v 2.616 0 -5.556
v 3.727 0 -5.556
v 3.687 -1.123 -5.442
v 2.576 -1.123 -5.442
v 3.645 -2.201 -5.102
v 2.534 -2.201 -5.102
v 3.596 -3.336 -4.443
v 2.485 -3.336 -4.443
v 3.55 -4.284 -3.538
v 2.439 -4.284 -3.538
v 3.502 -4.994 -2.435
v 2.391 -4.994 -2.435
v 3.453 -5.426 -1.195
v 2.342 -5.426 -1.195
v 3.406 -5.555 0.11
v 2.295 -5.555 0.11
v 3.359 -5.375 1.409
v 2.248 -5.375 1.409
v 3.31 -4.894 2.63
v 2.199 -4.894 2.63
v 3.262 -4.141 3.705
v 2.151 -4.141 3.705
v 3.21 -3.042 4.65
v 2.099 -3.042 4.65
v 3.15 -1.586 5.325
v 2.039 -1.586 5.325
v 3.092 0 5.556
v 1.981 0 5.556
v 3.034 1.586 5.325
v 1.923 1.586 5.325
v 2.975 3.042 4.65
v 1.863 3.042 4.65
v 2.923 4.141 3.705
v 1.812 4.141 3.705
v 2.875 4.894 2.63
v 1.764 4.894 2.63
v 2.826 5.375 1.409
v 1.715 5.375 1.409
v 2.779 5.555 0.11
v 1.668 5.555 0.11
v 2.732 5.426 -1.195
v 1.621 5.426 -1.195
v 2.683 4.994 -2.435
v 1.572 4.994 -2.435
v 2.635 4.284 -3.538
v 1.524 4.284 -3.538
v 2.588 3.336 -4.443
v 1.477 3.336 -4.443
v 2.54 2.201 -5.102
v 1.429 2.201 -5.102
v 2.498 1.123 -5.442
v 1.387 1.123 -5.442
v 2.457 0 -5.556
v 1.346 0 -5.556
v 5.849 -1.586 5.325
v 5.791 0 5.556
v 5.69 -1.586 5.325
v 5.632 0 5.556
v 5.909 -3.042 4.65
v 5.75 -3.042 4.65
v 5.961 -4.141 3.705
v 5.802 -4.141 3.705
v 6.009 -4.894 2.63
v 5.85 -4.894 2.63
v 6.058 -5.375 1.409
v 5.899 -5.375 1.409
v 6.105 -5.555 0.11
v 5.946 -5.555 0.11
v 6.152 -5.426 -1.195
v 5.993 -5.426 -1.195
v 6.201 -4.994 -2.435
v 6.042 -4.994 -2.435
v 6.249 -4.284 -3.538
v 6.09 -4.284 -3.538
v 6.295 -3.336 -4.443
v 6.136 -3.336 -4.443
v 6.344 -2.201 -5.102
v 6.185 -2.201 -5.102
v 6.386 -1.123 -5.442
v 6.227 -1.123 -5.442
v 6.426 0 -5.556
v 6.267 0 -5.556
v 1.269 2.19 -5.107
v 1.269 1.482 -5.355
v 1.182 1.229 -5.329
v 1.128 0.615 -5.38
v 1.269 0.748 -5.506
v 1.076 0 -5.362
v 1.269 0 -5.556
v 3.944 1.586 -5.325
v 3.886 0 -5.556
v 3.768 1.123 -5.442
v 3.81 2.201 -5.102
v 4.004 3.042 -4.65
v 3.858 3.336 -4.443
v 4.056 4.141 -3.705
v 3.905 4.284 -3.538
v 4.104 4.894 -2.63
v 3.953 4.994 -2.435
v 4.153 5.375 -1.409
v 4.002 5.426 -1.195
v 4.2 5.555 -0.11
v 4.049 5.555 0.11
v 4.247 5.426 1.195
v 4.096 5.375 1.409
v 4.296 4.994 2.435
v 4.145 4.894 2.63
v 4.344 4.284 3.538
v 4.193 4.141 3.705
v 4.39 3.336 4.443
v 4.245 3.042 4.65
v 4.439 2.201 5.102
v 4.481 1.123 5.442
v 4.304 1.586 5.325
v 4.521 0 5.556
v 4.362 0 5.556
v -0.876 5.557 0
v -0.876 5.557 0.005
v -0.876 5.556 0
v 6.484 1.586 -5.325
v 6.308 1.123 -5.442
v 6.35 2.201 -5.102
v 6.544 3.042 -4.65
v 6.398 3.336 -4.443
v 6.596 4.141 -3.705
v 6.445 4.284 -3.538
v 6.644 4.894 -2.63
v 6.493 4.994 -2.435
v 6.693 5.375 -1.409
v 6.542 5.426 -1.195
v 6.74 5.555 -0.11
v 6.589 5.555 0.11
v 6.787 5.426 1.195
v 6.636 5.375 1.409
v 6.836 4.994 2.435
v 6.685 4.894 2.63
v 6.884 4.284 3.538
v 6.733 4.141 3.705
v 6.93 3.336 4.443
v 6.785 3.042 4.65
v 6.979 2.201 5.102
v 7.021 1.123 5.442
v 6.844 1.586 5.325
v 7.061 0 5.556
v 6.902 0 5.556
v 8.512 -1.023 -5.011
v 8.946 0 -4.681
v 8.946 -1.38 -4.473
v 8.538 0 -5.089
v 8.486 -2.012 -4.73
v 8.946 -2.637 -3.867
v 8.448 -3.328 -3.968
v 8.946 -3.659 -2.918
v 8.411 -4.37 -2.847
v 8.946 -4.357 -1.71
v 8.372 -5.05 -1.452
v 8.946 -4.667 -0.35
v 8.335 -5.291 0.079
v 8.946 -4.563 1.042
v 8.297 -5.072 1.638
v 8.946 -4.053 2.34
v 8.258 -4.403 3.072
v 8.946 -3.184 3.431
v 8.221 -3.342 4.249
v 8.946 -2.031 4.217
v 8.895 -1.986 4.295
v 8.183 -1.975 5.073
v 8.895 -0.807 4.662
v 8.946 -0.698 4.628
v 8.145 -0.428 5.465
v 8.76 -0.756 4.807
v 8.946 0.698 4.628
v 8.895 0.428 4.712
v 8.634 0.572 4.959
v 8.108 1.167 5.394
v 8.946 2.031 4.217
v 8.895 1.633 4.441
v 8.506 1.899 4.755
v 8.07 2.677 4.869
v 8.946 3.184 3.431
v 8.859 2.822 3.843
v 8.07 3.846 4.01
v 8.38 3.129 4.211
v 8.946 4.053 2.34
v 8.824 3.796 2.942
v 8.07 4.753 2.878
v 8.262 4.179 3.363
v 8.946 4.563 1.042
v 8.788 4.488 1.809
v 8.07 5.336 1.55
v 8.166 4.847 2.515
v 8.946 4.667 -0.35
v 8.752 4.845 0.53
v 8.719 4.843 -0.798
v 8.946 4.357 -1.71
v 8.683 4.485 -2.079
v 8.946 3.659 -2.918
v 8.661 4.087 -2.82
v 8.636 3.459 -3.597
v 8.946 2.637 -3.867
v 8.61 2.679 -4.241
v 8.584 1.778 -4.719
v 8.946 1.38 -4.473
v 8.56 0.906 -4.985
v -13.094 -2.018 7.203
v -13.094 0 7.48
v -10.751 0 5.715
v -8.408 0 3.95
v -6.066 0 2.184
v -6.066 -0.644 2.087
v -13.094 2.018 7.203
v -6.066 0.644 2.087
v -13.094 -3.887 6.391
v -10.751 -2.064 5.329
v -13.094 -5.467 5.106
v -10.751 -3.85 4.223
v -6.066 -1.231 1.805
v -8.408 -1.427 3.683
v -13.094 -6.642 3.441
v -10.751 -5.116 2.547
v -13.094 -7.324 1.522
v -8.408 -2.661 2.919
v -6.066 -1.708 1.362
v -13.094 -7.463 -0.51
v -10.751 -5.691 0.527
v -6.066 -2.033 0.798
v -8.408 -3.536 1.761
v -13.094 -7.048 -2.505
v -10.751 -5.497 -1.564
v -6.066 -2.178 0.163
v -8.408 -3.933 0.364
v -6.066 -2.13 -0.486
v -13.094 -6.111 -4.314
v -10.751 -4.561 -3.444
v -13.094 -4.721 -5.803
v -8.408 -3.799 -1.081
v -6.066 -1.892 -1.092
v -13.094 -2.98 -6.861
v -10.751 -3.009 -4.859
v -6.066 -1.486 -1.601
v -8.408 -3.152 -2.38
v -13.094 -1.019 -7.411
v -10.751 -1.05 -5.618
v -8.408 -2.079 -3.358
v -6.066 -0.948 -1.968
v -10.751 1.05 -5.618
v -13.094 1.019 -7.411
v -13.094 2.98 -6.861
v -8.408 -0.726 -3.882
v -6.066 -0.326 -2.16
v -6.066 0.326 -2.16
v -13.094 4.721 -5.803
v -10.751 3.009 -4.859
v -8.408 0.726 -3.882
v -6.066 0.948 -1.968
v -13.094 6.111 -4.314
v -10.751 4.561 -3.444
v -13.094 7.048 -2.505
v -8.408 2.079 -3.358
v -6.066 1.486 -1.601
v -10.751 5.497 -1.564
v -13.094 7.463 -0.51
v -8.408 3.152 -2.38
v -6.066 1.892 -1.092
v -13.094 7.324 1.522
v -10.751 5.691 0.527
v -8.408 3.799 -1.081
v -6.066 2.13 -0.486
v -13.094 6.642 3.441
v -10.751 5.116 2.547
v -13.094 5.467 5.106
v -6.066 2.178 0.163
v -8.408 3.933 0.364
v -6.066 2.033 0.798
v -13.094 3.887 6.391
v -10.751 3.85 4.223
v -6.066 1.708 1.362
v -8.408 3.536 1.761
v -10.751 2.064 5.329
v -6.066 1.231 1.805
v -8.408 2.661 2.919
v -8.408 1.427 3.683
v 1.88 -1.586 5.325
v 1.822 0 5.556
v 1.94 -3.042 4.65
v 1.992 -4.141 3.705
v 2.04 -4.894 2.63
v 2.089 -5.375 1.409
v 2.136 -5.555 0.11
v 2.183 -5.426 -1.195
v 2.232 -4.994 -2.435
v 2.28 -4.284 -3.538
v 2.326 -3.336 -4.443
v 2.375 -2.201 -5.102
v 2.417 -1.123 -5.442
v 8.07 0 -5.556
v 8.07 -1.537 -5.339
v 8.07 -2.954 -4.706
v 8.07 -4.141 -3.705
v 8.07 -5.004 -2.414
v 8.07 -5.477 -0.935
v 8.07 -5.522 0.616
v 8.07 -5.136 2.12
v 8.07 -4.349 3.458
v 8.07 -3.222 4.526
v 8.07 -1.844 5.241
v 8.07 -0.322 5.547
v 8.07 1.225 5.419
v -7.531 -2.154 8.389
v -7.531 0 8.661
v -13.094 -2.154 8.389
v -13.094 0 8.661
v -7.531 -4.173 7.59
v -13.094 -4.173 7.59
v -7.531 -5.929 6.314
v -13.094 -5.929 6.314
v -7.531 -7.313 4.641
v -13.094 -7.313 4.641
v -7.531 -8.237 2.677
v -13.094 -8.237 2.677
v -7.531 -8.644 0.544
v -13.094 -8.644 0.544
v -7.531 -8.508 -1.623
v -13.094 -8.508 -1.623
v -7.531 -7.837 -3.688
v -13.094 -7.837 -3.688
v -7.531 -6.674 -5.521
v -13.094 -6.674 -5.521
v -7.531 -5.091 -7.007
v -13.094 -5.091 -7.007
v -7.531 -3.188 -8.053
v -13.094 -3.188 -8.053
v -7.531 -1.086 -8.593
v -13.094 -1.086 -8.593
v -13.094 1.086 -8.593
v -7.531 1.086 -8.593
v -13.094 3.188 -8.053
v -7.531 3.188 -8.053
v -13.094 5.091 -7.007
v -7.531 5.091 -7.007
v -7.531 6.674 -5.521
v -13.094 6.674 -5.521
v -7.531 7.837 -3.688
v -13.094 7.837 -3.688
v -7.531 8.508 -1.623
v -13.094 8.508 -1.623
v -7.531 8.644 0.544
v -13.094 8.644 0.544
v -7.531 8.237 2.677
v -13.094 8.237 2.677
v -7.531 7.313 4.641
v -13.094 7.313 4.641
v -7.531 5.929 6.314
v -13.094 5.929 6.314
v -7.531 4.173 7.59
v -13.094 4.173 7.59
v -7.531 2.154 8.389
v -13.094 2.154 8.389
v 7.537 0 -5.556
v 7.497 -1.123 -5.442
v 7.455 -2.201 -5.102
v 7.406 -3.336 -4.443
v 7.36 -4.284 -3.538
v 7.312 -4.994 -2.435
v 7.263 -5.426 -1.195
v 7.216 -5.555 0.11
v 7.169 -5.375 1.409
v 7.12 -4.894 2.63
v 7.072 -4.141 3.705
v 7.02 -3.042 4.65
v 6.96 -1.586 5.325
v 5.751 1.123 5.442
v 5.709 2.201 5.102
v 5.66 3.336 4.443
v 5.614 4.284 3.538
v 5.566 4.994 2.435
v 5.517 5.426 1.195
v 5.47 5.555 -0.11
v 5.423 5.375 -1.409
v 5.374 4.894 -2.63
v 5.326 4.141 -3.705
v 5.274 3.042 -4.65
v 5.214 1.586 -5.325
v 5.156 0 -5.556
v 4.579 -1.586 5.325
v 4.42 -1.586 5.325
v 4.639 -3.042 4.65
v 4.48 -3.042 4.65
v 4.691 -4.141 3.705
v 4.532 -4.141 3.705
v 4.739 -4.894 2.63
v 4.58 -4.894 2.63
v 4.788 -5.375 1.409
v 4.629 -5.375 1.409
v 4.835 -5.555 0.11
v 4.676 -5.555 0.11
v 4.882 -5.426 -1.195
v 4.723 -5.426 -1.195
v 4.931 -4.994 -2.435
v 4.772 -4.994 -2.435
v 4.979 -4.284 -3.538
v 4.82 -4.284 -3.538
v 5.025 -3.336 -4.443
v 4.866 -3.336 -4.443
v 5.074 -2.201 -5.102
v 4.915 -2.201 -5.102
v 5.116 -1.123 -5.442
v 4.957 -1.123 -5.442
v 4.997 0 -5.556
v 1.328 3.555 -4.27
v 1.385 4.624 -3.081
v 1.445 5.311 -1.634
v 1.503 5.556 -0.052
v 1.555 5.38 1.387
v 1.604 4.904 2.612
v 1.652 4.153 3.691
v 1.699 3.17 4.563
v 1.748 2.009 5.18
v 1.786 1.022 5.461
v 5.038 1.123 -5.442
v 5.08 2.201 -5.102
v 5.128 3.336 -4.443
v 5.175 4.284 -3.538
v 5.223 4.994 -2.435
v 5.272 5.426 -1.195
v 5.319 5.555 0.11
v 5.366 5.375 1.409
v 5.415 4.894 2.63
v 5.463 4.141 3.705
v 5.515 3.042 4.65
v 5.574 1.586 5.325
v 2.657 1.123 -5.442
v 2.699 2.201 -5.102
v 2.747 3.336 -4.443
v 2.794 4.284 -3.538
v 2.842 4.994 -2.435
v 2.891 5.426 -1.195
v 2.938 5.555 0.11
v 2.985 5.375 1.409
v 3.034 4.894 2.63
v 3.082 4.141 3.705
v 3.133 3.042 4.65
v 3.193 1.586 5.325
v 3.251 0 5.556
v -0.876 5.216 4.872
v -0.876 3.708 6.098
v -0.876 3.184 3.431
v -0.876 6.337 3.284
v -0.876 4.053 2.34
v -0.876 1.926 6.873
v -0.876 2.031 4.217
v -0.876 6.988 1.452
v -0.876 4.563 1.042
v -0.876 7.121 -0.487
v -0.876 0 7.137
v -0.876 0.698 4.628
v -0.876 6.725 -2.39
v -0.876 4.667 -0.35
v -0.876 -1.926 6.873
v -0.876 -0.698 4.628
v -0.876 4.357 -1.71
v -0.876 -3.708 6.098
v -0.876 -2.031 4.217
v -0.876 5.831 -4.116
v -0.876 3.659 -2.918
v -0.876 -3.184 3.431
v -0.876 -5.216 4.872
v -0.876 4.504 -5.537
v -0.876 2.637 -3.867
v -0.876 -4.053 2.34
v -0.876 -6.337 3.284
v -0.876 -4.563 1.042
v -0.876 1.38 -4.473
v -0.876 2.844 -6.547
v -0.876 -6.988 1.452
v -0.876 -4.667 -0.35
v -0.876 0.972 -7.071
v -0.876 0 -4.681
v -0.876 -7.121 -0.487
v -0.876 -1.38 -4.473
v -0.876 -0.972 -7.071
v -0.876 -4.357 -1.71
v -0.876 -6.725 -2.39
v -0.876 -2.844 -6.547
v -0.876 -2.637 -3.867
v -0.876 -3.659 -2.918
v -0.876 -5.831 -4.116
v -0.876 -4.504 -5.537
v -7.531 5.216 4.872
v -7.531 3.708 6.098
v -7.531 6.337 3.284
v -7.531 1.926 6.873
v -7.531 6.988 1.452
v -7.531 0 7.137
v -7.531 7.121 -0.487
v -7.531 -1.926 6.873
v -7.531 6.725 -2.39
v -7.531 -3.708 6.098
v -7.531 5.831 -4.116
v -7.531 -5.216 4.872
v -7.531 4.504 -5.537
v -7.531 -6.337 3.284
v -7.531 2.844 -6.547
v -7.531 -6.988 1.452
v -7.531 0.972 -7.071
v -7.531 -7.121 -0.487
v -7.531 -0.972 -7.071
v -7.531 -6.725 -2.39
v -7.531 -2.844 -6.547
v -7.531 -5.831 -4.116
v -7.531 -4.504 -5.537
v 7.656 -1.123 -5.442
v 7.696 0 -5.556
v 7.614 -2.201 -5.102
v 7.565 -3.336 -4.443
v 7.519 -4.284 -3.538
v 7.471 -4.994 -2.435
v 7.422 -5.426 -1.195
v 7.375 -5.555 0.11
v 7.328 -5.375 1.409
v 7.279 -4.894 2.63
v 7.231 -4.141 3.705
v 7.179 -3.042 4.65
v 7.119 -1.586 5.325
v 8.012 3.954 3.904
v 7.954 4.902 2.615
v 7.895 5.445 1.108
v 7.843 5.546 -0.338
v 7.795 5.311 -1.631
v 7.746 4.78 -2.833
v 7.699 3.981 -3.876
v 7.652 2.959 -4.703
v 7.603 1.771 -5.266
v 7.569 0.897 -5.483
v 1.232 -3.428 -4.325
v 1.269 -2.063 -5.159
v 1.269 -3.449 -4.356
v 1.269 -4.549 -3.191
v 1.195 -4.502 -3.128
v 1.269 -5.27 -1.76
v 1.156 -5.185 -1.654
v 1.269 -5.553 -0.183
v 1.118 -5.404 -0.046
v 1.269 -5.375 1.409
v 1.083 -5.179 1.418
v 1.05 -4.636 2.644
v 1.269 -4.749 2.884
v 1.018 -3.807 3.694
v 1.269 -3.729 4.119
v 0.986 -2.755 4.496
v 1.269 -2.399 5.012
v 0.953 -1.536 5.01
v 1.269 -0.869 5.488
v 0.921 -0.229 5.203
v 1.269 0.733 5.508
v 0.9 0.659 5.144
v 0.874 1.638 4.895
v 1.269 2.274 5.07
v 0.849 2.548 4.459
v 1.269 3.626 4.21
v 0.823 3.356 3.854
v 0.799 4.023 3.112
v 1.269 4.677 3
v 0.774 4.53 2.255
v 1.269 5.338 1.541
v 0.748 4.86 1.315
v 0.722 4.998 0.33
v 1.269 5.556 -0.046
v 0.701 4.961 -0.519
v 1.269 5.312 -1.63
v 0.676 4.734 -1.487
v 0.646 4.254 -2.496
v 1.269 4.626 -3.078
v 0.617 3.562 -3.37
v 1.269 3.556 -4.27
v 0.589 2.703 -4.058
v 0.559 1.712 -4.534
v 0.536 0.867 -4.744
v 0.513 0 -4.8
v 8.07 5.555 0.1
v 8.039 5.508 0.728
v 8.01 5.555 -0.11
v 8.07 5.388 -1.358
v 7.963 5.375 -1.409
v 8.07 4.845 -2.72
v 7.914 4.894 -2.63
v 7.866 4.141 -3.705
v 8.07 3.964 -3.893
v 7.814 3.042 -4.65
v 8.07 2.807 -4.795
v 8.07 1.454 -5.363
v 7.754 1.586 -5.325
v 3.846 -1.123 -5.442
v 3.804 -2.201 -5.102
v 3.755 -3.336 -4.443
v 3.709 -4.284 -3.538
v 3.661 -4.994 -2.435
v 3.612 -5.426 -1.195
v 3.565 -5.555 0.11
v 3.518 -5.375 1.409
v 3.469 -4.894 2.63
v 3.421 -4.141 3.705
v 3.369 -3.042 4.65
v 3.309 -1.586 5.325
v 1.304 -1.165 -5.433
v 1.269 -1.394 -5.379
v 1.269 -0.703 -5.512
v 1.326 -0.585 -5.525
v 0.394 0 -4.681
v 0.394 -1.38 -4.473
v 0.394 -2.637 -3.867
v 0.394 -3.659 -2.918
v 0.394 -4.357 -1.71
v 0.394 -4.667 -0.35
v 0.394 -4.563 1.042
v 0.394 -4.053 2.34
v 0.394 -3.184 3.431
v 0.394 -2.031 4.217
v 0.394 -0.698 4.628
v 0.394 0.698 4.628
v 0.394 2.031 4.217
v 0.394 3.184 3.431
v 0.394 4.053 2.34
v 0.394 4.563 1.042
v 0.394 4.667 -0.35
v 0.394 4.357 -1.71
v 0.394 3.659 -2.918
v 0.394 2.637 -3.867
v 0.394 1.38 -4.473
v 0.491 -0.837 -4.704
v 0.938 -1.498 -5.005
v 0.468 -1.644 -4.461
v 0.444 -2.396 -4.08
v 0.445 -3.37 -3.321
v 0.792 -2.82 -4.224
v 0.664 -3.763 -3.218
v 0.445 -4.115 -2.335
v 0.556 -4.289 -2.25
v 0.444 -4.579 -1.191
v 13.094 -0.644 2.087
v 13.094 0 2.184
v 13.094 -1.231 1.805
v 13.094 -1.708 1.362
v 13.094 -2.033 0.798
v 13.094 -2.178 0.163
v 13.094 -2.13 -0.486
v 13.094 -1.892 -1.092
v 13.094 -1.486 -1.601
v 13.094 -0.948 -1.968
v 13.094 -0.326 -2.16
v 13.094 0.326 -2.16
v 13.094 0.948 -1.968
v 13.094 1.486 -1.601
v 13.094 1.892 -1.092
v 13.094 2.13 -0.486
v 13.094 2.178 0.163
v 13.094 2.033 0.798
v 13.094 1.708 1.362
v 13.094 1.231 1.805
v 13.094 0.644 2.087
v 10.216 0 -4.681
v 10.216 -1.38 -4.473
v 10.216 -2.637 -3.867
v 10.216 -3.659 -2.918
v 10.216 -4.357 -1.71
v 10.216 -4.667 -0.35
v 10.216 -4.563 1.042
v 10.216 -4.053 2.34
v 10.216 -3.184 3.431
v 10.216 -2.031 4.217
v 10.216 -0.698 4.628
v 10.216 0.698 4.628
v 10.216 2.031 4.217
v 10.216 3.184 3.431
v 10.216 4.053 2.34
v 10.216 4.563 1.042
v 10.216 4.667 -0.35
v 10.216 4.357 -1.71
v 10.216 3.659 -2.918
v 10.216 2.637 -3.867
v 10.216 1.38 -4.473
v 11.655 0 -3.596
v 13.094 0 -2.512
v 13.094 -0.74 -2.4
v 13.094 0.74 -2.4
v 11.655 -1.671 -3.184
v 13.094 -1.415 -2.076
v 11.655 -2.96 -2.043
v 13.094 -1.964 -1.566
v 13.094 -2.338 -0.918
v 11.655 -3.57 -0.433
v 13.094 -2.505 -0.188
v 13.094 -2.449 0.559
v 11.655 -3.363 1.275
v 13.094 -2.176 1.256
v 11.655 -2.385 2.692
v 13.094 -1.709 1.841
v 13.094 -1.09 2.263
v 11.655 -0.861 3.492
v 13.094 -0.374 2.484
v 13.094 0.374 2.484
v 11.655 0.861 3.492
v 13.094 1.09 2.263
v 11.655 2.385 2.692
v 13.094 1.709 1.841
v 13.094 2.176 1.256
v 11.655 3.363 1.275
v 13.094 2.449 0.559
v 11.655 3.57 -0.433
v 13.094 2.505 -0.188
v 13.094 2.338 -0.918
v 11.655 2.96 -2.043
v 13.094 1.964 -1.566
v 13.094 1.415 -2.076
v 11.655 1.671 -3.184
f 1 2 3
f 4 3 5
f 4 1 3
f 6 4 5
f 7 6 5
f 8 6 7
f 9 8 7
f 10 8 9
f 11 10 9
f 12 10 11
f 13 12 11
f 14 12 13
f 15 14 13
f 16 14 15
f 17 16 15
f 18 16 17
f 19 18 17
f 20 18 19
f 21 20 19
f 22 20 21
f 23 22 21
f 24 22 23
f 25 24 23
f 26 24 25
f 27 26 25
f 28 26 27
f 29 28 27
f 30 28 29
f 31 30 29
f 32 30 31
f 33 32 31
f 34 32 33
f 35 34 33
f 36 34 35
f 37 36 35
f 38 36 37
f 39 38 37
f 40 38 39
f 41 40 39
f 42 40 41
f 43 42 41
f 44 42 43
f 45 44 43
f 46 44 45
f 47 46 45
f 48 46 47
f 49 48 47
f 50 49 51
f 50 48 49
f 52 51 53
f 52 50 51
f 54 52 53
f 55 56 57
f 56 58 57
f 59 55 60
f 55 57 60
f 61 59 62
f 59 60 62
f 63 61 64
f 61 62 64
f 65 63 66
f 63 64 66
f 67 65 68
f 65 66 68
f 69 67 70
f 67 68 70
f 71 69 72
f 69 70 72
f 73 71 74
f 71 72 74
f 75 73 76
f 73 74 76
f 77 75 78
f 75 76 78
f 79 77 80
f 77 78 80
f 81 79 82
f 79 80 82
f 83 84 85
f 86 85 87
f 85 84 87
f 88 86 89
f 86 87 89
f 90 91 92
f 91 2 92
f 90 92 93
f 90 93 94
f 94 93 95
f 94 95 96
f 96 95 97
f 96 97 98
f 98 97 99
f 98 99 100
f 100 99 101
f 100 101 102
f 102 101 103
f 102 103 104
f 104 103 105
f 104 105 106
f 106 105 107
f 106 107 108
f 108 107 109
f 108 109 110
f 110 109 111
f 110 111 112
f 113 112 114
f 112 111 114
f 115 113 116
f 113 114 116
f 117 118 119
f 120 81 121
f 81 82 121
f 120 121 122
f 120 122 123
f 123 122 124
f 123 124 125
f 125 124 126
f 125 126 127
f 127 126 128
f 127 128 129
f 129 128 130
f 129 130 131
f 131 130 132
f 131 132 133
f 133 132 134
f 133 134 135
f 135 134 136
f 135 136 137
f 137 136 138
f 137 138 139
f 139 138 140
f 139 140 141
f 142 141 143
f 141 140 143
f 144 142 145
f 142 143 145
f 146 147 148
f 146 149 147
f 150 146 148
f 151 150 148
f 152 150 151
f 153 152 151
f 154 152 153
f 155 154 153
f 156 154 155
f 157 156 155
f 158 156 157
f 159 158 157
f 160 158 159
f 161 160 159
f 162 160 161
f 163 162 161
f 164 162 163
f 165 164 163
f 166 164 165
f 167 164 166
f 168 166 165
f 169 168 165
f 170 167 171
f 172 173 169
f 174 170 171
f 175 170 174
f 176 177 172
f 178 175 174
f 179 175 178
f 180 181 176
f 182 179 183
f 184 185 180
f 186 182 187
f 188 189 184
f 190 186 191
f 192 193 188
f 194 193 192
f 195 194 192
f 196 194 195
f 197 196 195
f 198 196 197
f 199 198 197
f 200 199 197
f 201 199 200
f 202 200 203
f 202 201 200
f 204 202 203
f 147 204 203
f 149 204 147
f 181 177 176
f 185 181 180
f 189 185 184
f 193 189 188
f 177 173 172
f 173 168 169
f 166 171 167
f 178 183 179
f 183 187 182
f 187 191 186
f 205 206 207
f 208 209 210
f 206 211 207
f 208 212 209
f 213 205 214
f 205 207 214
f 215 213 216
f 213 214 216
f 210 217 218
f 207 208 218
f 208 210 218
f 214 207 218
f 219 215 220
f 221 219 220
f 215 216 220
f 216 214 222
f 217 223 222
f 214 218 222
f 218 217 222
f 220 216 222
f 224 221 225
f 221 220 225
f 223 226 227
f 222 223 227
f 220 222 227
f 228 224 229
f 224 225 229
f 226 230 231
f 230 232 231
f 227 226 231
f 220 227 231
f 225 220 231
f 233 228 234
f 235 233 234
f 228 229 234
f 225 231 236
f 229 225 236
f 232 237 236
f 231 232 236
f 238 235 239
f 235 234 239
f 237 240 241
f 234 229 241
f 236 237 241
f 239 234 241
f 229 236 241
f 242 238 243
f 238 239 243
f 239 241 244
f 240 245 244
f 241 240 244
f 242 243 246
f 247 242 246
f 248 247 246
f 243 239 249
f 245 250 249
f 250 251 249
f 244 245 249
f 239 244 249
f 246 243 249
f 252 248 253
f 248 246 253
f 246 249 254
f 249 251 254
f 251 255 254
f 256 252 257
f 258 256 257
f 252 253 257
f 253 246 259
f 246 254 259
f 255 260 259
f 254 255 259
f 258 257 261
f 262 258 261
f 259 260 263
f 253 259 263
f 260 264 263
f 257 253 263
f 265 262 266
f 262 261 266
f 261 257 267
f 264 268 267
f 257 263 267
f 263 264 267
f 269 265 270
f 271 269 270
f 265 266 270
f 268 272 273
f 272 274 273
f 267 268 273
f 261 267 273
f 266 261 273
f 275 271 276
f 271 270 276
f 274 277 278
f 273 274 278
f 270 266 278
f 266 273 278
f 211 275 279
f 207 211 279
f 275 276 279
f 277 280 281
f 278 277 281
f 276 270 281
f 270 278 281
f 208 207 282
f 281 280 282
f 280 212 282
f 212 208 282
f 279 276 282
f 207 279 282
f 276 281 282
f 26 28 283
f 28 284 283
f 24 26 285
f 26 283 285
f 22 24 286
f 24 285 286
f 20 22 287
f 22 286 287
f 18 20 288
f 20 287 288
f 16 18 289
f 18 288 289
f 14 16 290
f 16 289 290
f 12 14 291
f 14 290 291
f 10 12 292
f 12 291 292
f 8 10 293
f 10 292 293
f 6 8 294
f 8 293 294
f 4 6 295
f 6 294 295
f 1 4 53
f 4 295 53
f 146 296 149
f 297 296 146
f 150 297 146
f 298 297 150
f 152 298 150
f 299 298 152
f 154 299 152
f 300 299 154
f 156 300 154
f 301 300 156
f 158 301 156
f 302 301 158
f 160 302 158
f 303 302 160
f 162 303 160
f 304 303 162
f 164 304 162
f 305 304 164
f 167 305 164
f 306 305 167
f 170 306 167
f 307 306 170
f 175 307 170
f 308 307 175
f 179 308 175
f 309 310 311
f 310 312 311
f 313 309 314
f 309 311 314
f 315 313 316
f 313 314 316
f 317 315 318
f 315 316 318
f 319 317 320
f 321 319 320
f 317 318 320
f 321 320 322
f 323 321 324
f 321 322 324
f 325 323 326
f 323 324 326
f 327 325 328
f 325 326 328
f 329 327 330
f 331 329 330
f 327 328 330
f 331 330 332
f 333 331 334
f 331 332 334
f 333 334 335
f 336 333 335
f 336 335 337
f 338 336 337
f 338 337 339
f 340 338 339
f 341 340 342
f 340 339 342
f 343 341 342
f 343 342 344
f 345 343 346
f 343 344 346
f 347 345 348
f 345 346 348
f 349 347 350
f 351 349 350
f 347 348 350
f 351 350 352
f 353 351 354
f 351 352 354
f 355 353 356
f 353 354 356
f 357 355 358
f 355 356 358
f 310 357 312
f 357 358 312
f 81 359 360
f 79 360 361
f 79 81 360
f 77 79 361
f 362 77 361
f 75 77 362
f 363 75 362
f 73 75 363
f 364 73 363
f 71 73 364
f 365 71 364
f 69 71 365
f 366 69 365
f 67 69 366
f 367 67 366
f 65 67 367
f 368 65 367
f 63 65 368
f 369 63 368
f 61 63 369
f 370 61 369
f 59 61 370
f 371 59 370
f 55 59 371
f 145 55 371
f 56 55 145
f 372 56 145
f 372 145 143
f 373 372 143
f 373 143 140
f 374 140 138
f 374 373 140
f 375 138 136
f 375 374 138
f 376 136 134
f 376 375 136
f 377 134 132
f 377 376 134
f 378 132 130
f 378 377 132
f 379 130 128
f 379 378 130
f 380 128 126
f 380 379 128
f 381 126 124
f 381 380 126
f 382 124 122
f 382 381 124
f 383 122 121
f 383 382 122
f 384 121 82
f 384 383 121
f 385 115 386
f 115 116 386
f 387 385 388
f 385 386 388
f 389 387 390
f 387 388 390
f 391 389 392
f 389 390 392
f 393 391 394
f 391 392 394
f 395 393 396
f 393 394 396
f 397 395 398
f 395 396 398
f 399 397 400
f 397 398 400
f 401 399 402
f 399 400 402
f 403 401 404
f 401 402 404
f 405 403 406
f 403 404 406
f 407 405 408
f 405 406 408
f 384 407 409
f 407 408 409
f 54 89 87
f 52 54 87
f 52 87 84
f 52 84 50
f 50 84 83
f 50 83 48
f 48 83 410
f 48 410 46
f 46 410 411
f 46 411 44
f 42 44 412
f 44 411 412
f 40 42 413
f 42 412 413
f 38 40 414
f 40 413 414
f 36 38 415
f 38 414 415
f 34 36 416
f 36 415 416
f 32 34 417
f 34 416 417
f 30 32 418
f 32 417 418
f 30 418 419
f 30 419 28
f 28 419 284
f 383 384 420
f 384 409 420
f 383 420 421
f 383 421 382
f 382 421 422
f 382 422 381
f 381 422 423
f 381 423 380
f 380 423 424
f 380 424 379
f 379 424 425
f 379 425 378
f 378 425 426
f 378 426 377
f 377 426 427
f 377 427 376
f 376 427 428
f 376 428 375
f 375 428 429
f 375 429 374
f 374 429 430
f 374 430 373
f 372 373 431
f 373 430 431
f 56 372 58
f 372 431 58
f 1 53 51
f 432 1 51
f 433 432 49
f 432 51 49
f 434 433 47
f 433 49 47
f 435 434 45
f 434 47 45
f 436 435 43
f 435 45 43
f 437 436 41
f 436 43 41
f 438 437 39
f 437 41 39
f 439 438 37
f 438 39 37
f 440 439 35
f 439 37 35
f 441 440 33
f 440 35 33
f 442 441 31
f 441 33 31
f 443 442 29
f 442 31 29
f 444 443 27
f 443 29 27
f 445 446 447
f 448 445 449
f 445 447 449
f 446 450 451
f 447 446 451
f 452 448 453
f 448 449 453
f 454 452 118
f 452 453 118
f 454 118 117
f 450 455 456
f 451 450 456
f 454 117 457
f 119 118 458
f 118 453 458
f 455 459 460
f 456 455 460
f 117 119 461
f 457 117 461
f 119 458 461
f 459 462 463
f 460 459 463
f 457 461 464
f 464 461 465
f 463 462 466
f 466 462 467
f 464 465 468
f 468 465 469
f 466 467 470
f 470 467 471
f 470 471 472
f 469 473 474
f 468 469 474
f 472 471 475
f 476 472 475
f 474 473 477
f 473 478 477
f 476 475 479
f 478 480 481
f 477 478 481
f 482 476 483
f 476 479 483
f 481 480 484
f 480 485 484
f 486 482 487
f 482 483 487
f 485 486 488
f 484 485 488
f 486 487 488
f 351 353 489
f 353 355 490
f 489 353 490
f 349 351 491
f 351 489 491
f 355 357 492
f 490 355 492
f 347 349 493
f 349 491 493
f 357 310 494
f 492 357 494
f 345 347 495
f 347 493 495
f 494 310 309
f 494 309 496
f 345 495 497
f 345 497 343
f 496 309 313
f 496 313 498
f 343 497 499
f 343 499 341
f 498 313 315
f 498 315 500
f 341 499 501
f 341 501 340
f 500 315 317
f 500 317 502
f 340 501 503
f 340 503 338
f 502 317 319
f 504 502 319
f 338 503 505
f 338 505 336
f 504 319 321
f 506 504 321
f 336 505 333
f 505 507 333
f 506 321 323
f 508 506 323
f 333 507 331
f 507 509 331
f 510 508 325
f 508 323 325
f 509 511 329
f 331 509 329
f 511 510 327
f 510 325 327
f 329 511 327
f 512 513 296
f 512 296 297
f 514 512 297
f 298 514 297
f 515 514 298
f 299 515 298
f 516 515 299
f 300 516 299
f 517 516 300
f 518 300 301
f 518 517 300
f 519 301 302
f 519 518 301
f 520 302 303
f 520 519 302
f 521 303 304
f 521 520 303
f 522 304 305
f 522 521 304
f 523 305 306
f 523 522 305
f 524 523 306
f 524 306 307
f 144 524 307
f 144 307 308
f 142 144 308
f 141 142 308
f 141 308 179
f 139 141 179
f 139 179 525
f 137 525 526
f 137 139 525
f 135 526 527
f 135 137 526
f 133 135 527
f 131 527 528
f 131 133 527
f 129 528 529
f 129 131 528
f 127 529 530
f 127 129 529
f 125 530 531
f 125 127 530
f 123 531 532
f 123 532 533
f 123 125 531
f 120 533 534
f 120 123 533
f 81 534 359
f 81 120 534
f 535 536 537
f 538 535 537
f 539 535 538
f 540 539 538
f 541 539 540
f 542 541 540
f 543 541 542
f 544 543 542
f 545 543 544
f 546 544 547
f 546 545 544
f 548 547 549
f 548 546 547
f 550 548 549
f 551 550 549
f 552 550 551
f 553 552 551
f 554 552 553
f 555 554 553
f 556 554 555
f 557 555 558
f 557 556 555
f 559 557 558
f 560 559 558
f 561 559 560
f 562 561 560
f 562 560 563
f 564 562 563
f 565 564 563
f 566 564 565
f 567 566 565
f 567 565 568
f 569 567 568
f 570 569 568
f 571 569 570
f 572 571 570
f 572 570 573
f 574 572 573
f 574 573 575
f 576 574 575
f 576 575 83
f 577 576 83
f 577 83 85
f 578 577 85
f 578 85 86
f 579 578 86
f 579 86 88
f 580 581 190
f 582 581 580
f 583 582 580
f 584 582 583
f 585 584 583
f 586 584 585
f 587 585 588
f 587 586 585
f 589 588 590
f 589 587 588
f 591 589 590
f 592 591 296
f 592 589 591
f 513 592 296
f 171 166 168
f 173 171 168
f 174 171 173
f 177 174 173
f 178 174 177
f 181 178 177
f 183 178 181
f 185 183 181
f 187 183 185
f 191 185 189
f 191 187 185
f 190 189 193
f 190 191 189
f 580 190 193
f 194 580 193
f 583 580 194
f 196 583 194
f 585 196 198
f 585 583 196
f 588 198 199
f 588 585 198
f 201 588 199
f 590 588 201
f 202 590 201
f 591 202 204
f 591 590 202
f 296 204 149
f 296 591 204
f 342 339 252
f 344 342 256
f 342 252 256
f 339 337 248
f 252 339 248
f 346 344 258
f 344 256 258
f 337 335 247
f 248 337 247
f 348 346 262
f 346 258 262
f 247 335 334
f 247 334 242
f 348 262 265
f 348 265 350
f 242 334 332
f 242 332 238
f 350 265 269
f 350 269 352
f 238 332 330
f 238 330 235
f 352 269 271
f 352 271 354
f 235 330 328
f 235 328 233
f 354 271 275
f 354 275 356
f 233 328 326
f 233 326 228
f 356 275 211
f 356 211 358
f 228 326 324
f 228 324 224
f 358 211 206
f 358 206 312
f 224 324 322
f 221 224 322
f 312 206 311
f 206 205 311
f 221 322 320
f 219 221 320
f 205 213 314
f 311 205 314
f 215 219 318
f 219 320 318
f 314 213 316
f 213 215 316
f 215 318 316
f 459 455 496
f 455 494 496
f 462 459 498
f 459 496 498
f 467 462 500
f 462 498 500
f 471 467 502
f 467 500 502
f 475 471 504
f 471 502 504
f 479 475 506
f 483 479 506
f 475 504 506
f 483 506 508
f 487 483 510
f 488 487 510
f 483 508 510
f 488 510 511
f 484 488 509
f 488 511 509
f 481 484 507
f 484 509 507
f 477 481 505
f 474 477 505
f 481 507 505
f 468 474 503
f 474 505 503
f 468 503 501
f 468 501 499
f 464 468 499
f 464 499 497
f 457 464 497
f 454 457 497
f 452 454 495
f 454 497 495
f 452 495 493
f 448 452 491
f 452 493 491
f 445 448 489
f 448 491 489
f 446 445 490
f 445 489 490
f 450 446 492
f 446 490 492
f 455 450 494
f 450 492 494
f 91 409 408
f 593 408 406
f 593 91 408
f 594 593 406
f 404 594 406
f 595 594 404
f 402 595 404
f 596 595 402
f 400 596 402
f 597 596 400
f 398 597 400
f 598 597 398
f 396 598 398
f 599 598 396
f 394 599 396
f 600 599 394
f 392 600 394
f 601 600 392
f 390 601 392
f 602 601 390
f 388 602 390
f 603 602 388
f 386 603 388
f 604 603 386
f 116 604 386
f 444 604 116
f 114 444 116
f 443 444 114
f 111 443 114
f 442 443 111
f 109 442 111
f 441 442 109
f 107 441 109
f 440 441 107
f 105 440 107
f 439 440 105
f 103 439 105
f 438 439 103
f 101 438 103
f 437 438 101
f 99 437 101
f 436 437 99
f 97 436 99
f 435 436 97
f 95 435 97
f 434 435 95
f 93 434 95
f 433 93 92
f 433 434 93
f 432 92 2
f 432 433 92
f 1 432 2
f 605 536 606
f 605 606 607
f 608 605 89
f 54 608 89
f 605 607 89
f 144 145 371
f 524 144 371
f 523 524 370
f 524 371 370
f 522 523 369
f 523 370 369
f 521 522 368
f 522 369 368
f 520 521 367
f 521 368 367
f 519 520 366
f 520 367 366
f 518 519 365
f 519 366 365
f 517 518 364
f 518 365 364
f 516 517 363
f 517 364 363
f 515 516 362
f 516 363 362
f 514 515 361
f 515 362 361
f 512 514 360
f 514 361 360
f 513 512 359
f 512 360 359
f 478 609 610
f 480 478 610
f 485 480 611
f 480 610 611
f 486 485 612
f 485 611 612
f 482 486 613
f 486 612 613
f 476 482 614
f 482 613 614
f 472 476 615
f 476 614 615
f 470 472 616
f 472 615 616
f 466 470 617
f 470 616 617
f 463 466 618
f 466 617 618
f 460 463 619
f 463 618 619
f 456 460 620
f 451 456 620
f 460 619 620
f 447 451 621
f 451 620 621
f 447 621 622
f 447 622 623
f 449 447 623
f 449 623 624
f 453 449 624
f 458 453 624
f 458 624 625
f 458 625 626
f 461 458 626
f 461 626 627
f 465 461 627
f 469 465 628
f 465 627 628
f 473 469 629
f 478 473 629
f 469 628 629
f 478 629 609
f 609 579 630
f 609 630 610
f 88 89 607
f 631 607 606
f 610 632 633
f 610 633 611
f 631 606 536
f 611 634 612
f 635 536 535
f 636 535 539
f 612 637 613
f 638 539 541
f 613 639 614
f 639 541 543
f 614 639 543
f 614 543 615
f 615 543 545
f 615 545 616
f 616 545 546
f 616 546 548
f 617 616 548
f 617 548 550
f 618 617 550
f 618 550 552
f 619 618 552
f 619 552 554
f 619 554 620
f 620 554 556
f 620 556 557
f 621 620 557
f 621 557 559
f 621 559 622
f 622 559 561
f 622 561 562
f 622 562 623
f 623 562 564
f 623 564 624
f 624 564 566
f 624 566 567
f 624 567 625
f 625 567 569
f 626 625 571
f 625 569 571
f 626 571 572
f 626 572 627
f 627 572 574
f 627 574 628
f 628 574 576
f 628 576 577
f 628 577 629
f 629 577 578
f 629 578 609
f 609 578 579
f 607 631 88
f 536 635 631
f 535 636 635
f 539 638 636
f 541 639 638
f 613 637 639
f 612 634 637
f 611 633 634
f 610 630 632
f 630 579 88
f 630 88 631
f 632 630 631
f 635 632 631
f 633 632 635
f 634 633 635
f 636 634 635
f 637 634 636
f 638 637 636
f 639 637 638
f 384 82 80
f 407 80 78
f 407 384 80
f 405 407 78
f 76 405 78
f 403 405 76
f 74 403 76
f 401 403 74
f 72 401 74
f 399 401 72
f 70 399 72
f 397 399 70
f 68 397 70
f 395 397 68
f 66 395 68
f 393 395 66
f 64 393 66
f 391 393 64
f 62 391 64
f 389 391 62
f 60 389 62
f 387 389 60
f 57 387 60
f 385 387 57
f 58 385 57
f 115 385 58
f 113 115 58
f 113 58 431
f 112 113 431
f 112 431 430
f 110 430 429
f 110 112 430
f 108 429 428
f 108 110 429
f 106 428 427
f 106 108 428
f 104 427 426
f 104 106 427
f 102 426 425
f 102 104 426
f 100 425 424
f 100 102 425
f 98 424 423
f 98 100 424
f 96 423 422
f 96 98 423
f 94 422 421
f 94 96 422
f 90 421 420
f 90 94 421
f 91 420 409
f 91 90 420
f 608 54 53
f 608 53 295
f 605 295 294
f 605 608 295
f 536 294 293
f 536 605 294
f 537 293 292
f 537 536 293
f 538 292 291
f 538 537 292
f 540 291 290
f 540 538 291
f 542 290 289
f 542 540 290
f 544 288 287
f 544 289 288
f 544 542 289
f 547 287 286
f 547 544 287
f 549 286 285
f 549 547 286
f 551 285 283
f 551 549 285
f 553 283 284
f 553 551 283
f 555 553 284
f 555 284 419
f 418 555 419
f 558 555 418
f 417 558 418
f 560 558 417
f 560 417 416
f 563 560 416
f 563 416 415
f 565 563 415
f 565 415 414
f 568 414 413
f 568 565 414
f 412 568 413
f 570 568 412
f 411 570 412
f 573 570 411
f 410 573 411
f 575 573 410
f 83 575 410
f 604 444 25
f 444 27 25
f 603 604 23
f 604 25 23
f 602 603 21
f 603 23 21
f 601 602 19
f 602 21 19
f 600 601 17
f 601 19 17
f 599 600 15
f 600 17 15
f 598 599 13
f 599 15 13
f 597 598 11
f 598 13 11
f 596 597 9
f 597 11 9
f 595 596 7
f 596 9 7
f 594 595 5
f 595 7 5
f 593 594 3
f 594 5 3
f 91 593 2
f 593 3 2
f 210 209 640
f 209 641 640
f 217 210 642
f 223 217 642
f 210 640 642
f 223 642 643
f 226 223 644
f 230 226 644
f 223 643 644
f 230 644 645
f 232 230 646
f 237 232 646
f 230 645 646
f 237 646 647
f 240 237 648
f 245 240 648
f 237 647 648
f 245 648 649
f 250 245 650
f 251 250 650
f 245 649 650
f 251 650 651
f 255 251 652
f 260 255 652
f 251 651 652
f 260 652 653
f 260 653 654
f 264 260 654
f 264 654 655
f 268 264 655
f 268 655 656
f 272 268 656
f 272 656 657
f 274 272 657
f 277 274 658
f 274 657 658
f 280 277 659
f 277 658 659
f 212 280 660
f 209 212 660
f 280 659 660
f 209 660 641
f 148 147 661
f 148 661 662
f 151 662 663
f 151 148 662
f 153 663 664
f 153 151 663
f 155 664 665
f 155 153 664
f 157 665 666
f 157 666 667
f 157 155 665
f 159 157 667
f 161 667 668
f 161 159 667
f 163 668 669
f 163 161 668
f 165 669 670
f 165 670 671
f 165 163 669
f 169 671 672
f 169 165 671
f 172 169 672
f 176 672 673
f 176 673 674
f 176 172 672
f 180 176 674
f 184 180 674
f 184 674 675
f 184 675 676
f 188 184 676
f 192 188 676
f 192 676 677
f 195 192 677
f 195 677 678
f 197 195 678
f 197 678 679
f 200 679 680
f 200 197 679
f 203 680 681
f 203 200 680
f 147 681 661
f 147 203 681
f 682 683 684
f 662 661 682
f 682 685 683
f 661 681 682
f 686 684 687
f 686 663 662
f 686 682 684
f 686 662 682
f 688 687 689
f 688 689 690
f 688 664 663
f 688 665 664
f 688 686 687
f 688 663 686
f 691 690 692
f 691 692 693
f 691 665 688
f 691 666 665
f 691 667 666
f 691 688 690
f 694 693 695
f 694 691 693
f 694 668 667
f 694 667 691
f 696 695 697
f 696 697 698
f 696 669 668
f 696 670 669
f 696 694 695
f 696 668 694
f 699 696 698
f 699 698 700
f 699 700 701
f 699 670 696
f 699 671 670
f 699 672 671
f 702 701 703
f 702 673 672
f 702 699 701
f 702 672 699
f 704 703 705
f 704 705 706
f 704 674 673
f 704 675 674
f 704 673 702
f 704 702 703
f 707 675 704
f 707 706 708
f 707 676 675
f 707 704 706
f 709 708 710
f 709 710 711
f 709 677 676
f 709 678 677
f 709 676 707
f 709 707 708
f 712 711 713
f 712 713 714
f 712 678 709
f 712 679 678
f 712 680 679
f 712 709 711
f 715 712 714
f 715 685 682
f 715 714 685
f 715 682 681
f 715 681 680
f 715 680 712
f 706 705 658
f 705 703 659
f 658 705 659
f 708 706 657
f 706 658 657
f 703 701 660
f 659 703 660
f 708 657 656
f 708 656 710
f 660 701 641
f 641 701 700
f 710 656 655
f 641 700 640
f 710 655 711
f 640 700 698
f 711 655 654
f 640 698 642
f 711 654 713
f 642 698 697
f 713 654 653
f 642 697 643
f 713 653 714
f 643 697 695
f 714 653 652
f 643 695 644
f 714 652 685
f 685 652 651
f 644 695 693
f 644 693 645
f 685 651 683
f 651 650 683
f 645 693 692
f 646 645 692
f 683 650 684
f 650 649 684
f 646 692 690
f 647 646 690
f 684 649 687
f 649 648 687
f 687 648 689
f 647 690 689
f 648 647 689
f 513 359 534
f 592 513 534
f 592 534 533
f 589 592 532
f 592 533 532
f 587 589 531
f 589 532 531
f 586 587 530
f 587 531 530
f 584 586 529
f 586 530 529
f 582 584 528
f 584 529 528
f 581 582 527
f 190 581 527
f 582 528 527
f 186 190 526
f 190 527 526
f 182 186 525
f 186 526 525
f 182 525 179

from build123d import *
from build123d.topology import SkipClean

# Parameters (mm, degrees)
CUT_SWEEP1_PITCH = 1.27


with BuildPart() as part:
    # Sketch1 → Revolve1 (revolve)
    with BuildSketch(Plane.XY, mode=Mode.PRIVATE) as revolve1_sk:
        Polygon((-13.0937, 8.6614), (-13.0937, 7.4803), (-6.065803329, 2.1844), (13.0937, 2.1844), (13.0937, 2.51206), (13.0937, 5.55625), (9.053923424, 5.55625), (-0.8763, 5.55625), (-0.8763, 7.1374), (-7.5311, 7.1374), (-7.5311, 8.6614), align=None)
    revolve(revolve1_sk.sketch.rotate(Axis((-13.0937, 0, 0), (1, 0, 0)), 90), axis=Axis((-13.0937, 0, 0), (1, 0, 0)))

    # Cut-Sweep1: the profile of Sketch4 profile screwed along a right-hand helix of 11 turns, 8 arcs to a turn; built about Z, then put on its axis
    cut_sweep1_z = Axis((0, 0, 0), (0, 0, 1))
    cut_sweep1_corners = [(5.55655, 0, 0.000173205), (5.55655, 0, -1.111423205), (4.731360803, 0, -0.635), (4.731360803, 0, -0.47625)]
    with BuildLine(mode=Mode.PRIVATE) as cut_sweep1_profile:
        Line(cut_sweep1_corners[0], cut_sweep1_corners[1])
        Line(cut_sweep1_corners[1], cut_sweep1_corners[2])
        Line(cut_sweep1_corners[2], cut_sweep1_corners[3])
        Line(cut_sweep1_corners[3], cut_sweep1_corners[0])
    cut_sweep1_cap = Face(cut_sweep1_profile.wire())
    cut_sweep1_turn_angles = [0, 22.5, 45, 67.5, 90, 112.5, 135, 157.5, 180, 202.5, 225, 247.5, 270, 292.5, 315, 337.5, 360]
    cut_sweep1_turn_weights = [1, 0.9238795325112867, 1, 0.9238795325112867, 1, 0.9238795325112867, 1, 0.9238795325112867, 1, 0.9238795325112867, 1, 0.9238795325112867, 1, 0.9238795325112867, 1, 0.9238795325112867, 1]
    cut_sweep1_turn_rails = [Edge.make_bspline([Vector(p[0], p[1], 0).rotate(cut_sweep1_z, cut_sweep1_turn_angles[k]) / cut_sweep1_turn_weights[k] + Vector(0, 0, p[2] + CUT_SWEEP1_PITCH * cut_sweep1_turn_angles[k] / 360) for k in range(17)], [0, 0, 0, 1, 1, 2, 2, 3, 3, 4, 4, 5, 5, 6, 6, 7, 7, 8, 8, 8], 2, cut_sweep1_turn_weights) for p in cut_sweep1_corners]
    cut_sweep1_turn_sides = [Face.make_surface_from_curves(cut_sweep1_turn_rails[p[0]], cut_sweep1_turn_rails[p[1]]) for p in [(0, 1), (1, 2), (2, 3), (3, 0)]]
    cut_sweep1_turn = Solid(Shell([*cut_sweep1_turn_sides, cut_sweep1_cap, cut_sweep1_cap.rotate(cut_sweep1_z, 360).moved(Location((0, 0, CUT_SWEEP1_PITCH * 360 / 360)))]))
    cut_sweep1_each = [*[cut_sweep1_turn.moved(Location((0, 0, CUT_SWEEP1_PITCH * i))) for i in range(11)]]
    add(Plane(origin=(13.0937, 0, 0), x_dir=(0, 1, 0), z_dir=(-1, 0, 0)) * Compound([cut_sweep1_each[i] for i in range(0, 11, 2)]), mode=Mode.SUBTRACT)
    add(Plane(origin=(13.0937, 0, 0), x_dir=(0, 1, 0), z_dir=(-1, 0, 0)) * Compound([cut_sweep1_each[i] for i in range(1, 11, 2)]), mode=Mode.SUBTRACT)

    # Sketch5 → Cut-Revolve1 (revolve, cut)
    with BuildSketch(Plane.XY, mode=Mode.PRIVATE) as cut_revolve1_sk:
        Polygon((13.0937, 2.51206), (10.216002239, 4.680560803), (8.946002239, 4.680560803), (8.070313042, 5.55625), (13.0937, 5.55625), align=None)
        Polygon((-0.8763, 5.55625), (-0.8763, 4.680560803), (0.3937, 4.680560803), (1.269389197, 5.55625), align=None)
    revolve(cut_revolve1_sk.sketch.rotate(Axis((0, 0, 0), (-1, 0, 0)), 90), axis=Axis((0, 0, 0), (-1, 0, 0)), mode=Mode.SUBTRACT)

    # Sketch6 → Revolve2 (revolve)
    with SkipClean():  # the faces are left unmerged after this step: merging them gives an invalid solid
        with BuildSketch(Plane.XY, mode=Mode.PRIVATE) as revolve2_sk:
            Polygon((1.269389197, 5.55625), (0.3937, 4.680560803), (8.946002239, 4.680560803), (8.070313042, 5.55625), align=None)
        revolve(revolve2_sk.sketch.rotate(Axis((0, 0, 0), (-1, 0, 0)), 90), axis=Axis((0, 0, 0), (-1, 0, 0)))
    add(part.part.scale(1), mode=Mode.REPLACE)  # the faces are merged on a copy


solid = part.part
